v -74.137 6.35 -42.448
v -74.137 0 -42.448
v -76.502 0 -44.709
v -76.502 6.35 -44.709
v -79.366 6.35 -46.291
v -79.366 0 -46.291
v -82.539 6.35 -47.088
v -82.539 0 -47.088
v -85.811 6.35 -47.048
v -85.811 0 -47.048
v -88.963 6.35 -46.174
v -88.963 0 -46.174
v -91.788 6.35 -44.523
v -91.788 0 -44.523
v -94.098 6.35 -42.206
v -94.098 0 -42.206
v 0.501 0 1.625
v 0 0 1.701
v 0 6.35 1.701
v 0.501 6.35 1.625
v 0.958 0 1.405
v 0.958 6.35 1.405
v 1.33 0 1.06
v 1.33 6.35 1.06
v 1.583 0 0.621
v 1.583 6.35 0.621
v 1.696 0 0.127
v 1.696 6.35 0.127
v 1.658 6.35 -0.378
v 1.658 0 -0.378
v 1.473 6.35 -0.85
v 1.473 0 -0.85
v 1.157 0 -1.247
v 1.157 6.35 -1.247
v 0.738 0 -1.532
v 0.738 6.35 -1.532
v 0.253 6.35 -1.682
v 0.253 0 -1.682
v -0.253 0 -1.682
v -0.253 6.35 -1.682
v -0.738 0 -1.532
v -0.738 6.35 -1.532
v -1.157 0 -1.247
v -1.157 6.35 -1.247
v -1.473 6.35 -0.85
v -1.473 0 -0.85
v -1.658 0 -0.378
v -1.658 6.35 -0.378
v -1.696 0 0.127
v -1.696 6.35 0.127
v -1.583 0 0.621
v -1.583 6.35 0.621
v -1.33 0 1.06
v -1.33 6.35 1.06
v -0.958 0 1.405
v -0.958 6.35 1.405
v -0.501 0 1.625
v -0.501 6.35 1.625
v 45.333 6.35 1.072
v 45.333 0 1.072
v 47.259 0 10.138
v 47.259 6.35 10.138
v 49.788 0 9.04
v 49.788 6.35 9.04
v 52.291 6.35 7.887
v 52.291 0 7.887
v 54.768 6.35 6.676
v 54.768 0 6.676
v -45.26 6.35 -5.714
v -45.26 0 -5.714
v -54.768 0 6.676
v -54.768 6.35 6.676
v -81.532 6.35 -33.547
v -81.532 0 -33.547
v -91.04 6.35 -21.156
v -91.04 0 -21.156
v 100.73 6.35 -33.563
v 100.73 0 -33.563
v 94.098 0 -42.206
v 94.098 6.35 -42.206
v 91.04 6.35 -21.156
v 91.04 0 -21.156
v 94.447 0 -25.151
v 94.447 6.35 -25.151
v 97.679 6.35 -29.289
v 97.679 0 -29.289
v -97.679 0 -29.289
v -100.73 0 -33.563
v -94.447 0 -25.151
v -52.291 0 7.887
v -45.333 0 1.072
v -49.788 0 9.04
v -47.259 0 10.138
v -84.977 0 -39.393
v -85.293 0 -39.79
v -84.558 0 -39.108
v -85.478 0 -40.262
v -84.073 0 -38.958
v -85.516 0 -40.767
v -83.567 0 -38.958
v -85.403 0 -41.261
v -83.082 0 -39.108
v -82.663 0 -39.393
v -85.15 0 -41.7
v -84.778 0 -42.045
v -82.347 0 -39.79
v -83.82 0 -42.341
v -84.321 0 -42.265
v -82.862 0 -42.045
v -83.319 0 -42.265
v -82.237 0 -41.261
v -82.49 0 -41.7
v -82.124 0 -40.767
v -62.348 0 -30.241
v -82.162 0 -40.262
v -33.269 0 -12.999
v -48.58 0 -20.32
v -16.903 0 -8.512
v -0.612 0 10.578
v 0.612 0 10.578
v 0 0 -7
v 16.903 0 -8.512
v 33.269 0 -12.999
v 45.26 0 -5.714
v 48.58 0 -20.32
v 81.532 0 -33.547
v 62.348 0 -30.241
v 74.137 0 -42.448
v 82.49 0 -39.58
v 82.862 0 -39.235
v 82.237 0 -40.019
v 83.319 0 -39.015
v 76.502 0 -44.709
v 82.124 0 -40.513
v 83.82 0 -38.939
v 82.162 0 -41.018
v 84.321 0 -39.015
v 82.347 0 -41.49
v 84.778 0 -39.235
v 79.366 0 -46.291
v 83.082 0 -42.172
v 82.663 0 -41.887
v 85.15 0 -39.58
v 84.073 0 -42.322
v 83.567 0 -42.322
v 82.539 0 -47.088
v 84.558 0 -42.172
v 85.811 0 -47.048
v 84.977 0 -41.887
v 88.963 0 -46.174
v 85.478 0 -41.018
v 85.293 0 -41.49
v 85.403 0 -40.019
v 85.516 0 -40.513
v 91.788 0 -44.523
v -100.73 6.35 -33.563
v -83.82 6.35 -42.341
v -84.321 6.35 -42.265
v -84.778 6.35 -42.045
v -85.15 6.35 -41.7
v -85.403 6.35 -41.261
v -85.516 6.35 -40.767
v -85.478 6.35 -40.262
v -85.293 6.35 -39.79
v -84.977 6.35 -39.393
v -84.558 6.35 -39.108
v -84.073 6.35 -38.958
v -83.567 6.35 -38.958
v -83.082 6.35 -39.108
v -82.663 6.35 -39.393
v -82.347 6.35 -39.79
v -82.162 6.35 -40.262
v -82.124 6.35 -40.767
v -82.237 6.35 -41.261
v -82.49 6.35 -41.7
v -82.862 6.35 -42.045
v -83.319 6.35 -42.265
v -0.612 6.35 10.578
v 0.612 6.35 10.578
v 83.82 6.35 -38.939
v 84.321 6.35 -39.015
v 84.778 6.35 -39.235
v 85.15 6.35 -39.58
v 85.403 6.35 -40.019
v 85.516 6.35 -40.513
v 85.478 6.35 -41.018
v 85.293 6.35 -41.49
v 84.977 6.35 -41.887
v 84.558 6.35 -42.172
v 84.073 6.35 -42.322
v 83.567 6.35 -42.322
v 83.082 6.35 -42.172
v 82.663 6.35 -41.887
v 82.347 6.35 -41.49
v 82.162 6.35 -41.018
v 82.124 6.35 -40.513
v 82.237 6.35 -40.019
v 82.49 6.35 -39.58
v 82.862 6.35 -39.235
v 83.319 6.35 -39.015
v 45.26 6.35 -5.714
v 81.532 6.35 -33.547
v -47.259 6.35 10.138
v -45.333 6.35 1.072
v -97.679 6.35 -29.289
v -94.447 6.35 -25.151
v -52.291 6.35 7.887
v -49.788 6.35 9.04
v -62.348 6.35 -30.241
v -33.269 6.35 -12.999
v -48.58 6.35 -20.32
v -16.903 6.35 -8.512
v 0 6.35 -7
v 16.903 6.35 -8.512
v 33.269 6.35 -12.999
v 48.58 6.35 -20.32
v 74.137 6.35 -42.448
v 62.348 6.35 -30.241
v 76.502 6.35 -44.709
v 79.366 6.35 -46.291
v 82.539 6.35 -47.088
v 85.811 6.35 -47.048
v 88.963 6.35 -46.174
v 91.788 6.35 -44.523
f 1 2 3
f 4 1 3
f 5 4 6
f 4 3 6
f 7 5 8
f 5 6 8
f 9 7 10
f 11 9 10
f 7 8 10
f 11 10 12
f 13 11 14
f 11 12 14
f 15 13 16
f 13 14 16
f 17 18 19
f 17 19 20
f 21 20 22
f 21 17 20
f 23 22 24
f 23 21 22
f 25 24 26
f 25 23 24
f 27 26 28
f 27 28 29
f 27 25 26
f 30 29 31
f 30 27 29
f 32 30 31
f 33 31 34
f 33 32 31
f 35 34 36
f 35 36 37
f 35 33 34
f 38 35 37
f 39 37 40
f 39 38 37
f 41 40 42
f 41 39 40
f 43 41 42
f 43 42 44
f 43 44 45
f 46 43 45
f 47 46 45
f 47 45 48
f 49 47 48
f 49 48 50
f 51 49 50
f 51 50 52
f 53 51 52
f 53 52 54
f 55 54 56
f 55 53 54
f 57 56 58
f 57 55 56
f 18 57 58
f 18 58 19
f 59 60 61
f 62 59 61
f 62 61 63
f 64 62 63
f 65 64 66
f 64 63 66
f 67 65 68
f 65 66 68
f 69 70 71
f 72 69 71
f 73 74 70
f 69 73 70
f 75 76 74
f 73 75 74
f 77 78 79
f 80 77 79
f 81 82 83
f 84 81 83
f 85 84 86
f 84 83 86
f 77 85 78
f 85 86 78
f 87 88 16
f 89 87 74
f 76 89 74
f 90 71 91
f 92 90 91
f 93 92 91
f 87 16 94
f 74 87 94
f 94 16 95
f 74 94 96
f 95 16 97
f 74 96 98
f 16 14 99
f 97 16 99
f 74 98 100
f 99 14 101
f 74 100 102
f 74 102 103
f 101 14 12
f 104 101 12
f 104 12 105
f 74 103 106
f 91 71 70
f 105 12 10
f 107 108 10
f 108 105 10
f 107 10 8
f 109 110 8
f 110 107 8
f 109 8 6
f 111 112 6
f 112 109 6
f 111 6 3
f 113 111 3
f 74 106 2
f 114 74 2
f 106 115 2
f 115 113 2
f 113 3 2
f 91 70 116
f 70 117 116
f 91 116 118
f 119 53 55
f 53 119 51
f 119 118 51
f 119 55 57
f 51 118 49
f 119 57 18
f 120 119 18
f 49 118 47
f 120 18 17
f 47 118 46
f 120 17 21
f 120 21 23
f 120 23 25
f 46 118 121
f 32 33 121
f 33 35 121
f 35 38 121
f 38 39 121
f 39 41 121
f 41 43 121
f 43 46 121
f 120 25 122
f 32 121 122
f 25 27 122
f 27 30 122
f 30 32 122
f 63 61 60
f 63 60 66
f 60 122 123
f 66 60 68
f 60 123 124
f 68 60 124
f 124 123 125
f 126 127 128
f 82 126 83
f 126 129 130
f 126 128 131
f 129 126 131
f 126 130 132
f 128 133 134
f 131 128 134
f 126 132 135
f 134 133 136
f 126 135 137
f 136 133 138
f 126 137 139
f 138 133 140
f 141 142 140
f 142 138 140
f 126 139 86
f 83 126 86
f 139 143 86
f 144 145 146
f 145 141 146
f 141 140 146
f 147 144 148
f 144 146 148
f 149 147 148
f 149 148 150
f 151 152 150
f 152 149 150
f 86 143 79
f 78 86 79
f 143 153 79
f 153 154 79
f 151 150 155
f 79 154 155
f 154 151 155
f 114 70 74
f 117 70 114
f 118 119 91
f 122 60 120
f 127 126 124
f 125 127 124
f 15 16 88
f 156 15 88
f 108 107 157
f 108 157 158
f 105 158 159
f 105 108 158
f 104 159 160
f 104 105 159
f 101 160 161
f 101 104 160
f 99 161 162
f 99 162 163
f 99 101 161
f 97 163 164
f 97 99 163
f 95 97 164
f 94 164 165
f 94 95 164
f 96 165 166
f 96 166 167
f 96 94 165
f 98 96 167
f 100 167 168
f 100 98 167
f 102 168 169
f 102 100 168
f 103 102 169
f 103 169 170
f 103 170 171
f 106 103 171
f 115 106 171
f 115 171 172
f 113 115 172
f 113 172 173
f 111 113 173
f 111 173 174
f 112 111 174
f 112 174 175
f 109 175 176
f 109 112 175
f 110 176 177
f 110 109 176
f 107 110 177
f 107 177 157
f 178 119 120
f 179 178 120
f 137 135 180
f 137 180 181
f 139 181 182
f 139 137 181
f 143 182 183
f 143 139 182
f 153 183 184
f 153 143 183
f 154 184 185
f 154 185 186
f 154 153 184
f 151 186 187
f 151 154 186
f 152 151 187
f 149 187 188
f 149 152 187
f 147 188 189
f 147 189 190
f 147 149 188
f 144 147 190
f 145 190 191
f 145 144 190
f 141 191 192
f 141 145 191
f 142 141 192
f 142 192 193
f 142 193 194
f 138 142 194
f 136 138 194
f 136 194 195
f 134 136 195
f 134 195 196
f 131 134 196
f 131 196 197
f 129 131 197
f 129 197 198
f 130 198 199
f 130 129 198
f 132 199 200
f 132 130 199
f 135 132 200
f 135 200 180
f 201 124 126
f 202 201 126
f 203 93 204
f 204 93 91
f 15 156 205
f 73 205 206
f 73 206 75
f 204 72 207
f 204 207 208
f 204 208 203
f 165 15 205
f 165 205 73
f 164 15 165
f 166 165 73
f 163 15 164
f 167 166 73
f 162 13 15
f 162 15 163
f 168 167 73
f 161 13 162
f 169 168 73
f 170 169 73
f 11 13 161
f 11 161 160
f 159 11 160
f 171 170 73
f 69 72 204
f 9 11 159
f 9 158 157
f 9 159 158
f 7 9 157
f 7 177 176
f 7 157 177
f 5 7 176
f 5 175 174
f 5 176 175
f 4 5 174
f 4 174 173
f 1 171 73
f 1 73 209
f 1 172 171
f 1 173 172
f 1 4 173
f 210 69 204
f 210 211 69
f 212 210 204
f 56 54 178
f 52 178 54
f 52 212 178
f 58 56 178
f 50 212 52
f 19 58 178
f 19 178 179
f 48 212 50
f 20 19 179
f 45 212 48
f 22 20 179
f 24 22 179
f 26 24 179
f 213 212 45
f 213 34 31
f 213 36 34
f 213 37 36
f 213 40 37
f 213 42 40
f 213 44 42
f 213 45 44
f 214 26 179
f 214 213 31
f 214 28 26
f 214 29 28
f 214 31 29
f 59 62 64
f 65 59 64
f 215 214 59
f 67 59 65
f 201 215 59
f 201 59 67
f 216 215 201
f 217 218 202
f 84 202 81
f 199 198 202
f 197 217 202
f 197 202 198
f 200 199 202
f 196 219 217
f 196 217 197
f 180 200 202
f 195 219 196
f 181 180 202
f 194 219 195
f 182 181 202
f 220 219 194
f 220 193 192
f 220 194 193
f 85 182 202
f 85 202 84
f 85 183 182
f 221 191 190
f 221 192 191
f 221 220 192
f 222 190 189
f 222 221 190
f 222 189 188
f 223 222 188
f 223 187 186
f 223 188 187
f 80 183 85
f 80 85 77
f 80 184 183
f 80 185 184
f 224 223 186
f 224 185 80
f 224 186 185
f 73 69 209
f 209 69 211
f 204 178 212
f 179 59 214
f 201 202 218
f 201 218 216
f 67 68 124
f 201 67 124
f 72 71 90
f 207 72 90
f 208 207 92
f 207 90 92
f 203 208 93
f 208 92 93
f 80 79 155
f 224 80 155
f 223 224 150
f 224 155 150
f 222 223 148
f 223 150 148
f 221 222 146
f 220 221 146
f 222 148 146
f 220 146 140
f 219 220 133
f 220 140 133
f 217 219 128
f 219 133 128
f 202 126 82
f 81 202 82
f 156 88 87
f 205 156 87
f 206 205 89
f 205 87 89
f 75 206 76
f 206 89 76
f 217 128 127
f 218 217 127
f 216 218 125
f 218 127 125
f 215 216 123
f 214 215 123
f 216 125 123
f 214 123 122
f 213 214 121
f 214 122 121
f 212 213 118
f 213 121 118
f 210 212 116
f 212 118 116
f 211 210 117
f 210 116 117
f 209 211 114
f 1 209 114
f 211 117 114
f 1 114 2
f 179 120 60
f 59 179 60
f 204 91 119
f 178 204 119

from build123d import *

# Parameters (mm, degrees)
SKETCH1_R           = 1.70053
BOSS_EXTRUDE1_DEPTH = 6.35


with BuildPart() as part:
    # Sketch1 → Boss-Extrude1 (new body)
    with BuildSketch(Plane(origin=(0, 0, 0), x_dir=(1, 0, 0), z_dir=(0, 1, 0))):
        with BuildLine():
            Line((100.72984212, 33.562647915), (94.097535909, 42.20603765))
            ThreePointArc((94.097535909, 42.20603765), (84.176111379, 47.17383179), (74.137013371, 42.448352501))
            ThreePointArc((74.137013371, 42.448352501), (0, 7.00024), (-74.137013371, 42.448352501))
            ThreePointArc((-74.137013371, 42.448352501), (-84.176111379, 47.17383179), (-94.097535909, 42.20603765))
            Line((-94.097535909, 42.20603765), (-100.72984212, 33.562647915))
            ThreePointArc((-100.72984212, 33.562647915), (-96.085326852, 27.20294582), (-91.039926176, 21.156354646))
            Line((-91.039926176, 21.156354646), (-81.532472576, 33.546709409))
            Line((-81.532472576, 33.546709409), (-63.396415217, 19.630423142))
            Line((-63.396415217, 19.630423142), (-45.260357858, 5.714136875))
            Line((-45.260357858, 5.714136875), (-54.767811458, -6.676217888))
            ThreePointArc((-54.767811458, -6.676217888), (-51.042995201, -8.470575753), (-47.259480127, -10.137606043))
            Line((-47.259480127, -10.137606043), (-45.332616871, -1.072427153))
            Line((-45.332616871, -1.072427153), (-0.611708566, -10.578149657))
            Line((-0.611708566, -10.578149657), (0.611708566, -10.578149657))
            Line((0.611708566, -10.578149657), (45.332616871, -1.072427153))
            Line((45.332616871, -1.072427153), (47.259480127, -10.137606043))
            ThreePointArc((47.259480127, -10.137606043), (51.042995201, -8.470575753), (54.767811458, -6.676217888))
            Line((54.767811458, -6.676217888), (45.260357858, 5.714136875))
            Line((45.260357858, 5.714136875), (63.396415217, 19.630423142))
            Line((63.396415217, 19.630423142), (81.532472576, 33.546709409))
            Line((81.532472576, 33.546709409), (91.039926176, 21.156354646))
            ThreePointArc((91.039926176, 21.156354646), (96.085326852, 27.20294582), (100.72984212, 33.562647915))
        make_face()
        with Locations(Location((83.82, 40.64, 0), (0, 0, 270))):
            Circle(SKETCH1_R, mode=Mode.SUBTRACT)
        with Locations(Location((-83.82, 40.64, 0), (0, 0, 90))):
            Circle(SKETCH1_R, mode=Mode.SUBTRACT)
        with Locations(Location((0, 0, 0), (0, 0, 270))):
            Circle(SKETCH1_R, mode=Mode.SUBTRACT)
    extrude(amount=BOSS_EXTRUDE1_DEPTH)


solid = part.part
